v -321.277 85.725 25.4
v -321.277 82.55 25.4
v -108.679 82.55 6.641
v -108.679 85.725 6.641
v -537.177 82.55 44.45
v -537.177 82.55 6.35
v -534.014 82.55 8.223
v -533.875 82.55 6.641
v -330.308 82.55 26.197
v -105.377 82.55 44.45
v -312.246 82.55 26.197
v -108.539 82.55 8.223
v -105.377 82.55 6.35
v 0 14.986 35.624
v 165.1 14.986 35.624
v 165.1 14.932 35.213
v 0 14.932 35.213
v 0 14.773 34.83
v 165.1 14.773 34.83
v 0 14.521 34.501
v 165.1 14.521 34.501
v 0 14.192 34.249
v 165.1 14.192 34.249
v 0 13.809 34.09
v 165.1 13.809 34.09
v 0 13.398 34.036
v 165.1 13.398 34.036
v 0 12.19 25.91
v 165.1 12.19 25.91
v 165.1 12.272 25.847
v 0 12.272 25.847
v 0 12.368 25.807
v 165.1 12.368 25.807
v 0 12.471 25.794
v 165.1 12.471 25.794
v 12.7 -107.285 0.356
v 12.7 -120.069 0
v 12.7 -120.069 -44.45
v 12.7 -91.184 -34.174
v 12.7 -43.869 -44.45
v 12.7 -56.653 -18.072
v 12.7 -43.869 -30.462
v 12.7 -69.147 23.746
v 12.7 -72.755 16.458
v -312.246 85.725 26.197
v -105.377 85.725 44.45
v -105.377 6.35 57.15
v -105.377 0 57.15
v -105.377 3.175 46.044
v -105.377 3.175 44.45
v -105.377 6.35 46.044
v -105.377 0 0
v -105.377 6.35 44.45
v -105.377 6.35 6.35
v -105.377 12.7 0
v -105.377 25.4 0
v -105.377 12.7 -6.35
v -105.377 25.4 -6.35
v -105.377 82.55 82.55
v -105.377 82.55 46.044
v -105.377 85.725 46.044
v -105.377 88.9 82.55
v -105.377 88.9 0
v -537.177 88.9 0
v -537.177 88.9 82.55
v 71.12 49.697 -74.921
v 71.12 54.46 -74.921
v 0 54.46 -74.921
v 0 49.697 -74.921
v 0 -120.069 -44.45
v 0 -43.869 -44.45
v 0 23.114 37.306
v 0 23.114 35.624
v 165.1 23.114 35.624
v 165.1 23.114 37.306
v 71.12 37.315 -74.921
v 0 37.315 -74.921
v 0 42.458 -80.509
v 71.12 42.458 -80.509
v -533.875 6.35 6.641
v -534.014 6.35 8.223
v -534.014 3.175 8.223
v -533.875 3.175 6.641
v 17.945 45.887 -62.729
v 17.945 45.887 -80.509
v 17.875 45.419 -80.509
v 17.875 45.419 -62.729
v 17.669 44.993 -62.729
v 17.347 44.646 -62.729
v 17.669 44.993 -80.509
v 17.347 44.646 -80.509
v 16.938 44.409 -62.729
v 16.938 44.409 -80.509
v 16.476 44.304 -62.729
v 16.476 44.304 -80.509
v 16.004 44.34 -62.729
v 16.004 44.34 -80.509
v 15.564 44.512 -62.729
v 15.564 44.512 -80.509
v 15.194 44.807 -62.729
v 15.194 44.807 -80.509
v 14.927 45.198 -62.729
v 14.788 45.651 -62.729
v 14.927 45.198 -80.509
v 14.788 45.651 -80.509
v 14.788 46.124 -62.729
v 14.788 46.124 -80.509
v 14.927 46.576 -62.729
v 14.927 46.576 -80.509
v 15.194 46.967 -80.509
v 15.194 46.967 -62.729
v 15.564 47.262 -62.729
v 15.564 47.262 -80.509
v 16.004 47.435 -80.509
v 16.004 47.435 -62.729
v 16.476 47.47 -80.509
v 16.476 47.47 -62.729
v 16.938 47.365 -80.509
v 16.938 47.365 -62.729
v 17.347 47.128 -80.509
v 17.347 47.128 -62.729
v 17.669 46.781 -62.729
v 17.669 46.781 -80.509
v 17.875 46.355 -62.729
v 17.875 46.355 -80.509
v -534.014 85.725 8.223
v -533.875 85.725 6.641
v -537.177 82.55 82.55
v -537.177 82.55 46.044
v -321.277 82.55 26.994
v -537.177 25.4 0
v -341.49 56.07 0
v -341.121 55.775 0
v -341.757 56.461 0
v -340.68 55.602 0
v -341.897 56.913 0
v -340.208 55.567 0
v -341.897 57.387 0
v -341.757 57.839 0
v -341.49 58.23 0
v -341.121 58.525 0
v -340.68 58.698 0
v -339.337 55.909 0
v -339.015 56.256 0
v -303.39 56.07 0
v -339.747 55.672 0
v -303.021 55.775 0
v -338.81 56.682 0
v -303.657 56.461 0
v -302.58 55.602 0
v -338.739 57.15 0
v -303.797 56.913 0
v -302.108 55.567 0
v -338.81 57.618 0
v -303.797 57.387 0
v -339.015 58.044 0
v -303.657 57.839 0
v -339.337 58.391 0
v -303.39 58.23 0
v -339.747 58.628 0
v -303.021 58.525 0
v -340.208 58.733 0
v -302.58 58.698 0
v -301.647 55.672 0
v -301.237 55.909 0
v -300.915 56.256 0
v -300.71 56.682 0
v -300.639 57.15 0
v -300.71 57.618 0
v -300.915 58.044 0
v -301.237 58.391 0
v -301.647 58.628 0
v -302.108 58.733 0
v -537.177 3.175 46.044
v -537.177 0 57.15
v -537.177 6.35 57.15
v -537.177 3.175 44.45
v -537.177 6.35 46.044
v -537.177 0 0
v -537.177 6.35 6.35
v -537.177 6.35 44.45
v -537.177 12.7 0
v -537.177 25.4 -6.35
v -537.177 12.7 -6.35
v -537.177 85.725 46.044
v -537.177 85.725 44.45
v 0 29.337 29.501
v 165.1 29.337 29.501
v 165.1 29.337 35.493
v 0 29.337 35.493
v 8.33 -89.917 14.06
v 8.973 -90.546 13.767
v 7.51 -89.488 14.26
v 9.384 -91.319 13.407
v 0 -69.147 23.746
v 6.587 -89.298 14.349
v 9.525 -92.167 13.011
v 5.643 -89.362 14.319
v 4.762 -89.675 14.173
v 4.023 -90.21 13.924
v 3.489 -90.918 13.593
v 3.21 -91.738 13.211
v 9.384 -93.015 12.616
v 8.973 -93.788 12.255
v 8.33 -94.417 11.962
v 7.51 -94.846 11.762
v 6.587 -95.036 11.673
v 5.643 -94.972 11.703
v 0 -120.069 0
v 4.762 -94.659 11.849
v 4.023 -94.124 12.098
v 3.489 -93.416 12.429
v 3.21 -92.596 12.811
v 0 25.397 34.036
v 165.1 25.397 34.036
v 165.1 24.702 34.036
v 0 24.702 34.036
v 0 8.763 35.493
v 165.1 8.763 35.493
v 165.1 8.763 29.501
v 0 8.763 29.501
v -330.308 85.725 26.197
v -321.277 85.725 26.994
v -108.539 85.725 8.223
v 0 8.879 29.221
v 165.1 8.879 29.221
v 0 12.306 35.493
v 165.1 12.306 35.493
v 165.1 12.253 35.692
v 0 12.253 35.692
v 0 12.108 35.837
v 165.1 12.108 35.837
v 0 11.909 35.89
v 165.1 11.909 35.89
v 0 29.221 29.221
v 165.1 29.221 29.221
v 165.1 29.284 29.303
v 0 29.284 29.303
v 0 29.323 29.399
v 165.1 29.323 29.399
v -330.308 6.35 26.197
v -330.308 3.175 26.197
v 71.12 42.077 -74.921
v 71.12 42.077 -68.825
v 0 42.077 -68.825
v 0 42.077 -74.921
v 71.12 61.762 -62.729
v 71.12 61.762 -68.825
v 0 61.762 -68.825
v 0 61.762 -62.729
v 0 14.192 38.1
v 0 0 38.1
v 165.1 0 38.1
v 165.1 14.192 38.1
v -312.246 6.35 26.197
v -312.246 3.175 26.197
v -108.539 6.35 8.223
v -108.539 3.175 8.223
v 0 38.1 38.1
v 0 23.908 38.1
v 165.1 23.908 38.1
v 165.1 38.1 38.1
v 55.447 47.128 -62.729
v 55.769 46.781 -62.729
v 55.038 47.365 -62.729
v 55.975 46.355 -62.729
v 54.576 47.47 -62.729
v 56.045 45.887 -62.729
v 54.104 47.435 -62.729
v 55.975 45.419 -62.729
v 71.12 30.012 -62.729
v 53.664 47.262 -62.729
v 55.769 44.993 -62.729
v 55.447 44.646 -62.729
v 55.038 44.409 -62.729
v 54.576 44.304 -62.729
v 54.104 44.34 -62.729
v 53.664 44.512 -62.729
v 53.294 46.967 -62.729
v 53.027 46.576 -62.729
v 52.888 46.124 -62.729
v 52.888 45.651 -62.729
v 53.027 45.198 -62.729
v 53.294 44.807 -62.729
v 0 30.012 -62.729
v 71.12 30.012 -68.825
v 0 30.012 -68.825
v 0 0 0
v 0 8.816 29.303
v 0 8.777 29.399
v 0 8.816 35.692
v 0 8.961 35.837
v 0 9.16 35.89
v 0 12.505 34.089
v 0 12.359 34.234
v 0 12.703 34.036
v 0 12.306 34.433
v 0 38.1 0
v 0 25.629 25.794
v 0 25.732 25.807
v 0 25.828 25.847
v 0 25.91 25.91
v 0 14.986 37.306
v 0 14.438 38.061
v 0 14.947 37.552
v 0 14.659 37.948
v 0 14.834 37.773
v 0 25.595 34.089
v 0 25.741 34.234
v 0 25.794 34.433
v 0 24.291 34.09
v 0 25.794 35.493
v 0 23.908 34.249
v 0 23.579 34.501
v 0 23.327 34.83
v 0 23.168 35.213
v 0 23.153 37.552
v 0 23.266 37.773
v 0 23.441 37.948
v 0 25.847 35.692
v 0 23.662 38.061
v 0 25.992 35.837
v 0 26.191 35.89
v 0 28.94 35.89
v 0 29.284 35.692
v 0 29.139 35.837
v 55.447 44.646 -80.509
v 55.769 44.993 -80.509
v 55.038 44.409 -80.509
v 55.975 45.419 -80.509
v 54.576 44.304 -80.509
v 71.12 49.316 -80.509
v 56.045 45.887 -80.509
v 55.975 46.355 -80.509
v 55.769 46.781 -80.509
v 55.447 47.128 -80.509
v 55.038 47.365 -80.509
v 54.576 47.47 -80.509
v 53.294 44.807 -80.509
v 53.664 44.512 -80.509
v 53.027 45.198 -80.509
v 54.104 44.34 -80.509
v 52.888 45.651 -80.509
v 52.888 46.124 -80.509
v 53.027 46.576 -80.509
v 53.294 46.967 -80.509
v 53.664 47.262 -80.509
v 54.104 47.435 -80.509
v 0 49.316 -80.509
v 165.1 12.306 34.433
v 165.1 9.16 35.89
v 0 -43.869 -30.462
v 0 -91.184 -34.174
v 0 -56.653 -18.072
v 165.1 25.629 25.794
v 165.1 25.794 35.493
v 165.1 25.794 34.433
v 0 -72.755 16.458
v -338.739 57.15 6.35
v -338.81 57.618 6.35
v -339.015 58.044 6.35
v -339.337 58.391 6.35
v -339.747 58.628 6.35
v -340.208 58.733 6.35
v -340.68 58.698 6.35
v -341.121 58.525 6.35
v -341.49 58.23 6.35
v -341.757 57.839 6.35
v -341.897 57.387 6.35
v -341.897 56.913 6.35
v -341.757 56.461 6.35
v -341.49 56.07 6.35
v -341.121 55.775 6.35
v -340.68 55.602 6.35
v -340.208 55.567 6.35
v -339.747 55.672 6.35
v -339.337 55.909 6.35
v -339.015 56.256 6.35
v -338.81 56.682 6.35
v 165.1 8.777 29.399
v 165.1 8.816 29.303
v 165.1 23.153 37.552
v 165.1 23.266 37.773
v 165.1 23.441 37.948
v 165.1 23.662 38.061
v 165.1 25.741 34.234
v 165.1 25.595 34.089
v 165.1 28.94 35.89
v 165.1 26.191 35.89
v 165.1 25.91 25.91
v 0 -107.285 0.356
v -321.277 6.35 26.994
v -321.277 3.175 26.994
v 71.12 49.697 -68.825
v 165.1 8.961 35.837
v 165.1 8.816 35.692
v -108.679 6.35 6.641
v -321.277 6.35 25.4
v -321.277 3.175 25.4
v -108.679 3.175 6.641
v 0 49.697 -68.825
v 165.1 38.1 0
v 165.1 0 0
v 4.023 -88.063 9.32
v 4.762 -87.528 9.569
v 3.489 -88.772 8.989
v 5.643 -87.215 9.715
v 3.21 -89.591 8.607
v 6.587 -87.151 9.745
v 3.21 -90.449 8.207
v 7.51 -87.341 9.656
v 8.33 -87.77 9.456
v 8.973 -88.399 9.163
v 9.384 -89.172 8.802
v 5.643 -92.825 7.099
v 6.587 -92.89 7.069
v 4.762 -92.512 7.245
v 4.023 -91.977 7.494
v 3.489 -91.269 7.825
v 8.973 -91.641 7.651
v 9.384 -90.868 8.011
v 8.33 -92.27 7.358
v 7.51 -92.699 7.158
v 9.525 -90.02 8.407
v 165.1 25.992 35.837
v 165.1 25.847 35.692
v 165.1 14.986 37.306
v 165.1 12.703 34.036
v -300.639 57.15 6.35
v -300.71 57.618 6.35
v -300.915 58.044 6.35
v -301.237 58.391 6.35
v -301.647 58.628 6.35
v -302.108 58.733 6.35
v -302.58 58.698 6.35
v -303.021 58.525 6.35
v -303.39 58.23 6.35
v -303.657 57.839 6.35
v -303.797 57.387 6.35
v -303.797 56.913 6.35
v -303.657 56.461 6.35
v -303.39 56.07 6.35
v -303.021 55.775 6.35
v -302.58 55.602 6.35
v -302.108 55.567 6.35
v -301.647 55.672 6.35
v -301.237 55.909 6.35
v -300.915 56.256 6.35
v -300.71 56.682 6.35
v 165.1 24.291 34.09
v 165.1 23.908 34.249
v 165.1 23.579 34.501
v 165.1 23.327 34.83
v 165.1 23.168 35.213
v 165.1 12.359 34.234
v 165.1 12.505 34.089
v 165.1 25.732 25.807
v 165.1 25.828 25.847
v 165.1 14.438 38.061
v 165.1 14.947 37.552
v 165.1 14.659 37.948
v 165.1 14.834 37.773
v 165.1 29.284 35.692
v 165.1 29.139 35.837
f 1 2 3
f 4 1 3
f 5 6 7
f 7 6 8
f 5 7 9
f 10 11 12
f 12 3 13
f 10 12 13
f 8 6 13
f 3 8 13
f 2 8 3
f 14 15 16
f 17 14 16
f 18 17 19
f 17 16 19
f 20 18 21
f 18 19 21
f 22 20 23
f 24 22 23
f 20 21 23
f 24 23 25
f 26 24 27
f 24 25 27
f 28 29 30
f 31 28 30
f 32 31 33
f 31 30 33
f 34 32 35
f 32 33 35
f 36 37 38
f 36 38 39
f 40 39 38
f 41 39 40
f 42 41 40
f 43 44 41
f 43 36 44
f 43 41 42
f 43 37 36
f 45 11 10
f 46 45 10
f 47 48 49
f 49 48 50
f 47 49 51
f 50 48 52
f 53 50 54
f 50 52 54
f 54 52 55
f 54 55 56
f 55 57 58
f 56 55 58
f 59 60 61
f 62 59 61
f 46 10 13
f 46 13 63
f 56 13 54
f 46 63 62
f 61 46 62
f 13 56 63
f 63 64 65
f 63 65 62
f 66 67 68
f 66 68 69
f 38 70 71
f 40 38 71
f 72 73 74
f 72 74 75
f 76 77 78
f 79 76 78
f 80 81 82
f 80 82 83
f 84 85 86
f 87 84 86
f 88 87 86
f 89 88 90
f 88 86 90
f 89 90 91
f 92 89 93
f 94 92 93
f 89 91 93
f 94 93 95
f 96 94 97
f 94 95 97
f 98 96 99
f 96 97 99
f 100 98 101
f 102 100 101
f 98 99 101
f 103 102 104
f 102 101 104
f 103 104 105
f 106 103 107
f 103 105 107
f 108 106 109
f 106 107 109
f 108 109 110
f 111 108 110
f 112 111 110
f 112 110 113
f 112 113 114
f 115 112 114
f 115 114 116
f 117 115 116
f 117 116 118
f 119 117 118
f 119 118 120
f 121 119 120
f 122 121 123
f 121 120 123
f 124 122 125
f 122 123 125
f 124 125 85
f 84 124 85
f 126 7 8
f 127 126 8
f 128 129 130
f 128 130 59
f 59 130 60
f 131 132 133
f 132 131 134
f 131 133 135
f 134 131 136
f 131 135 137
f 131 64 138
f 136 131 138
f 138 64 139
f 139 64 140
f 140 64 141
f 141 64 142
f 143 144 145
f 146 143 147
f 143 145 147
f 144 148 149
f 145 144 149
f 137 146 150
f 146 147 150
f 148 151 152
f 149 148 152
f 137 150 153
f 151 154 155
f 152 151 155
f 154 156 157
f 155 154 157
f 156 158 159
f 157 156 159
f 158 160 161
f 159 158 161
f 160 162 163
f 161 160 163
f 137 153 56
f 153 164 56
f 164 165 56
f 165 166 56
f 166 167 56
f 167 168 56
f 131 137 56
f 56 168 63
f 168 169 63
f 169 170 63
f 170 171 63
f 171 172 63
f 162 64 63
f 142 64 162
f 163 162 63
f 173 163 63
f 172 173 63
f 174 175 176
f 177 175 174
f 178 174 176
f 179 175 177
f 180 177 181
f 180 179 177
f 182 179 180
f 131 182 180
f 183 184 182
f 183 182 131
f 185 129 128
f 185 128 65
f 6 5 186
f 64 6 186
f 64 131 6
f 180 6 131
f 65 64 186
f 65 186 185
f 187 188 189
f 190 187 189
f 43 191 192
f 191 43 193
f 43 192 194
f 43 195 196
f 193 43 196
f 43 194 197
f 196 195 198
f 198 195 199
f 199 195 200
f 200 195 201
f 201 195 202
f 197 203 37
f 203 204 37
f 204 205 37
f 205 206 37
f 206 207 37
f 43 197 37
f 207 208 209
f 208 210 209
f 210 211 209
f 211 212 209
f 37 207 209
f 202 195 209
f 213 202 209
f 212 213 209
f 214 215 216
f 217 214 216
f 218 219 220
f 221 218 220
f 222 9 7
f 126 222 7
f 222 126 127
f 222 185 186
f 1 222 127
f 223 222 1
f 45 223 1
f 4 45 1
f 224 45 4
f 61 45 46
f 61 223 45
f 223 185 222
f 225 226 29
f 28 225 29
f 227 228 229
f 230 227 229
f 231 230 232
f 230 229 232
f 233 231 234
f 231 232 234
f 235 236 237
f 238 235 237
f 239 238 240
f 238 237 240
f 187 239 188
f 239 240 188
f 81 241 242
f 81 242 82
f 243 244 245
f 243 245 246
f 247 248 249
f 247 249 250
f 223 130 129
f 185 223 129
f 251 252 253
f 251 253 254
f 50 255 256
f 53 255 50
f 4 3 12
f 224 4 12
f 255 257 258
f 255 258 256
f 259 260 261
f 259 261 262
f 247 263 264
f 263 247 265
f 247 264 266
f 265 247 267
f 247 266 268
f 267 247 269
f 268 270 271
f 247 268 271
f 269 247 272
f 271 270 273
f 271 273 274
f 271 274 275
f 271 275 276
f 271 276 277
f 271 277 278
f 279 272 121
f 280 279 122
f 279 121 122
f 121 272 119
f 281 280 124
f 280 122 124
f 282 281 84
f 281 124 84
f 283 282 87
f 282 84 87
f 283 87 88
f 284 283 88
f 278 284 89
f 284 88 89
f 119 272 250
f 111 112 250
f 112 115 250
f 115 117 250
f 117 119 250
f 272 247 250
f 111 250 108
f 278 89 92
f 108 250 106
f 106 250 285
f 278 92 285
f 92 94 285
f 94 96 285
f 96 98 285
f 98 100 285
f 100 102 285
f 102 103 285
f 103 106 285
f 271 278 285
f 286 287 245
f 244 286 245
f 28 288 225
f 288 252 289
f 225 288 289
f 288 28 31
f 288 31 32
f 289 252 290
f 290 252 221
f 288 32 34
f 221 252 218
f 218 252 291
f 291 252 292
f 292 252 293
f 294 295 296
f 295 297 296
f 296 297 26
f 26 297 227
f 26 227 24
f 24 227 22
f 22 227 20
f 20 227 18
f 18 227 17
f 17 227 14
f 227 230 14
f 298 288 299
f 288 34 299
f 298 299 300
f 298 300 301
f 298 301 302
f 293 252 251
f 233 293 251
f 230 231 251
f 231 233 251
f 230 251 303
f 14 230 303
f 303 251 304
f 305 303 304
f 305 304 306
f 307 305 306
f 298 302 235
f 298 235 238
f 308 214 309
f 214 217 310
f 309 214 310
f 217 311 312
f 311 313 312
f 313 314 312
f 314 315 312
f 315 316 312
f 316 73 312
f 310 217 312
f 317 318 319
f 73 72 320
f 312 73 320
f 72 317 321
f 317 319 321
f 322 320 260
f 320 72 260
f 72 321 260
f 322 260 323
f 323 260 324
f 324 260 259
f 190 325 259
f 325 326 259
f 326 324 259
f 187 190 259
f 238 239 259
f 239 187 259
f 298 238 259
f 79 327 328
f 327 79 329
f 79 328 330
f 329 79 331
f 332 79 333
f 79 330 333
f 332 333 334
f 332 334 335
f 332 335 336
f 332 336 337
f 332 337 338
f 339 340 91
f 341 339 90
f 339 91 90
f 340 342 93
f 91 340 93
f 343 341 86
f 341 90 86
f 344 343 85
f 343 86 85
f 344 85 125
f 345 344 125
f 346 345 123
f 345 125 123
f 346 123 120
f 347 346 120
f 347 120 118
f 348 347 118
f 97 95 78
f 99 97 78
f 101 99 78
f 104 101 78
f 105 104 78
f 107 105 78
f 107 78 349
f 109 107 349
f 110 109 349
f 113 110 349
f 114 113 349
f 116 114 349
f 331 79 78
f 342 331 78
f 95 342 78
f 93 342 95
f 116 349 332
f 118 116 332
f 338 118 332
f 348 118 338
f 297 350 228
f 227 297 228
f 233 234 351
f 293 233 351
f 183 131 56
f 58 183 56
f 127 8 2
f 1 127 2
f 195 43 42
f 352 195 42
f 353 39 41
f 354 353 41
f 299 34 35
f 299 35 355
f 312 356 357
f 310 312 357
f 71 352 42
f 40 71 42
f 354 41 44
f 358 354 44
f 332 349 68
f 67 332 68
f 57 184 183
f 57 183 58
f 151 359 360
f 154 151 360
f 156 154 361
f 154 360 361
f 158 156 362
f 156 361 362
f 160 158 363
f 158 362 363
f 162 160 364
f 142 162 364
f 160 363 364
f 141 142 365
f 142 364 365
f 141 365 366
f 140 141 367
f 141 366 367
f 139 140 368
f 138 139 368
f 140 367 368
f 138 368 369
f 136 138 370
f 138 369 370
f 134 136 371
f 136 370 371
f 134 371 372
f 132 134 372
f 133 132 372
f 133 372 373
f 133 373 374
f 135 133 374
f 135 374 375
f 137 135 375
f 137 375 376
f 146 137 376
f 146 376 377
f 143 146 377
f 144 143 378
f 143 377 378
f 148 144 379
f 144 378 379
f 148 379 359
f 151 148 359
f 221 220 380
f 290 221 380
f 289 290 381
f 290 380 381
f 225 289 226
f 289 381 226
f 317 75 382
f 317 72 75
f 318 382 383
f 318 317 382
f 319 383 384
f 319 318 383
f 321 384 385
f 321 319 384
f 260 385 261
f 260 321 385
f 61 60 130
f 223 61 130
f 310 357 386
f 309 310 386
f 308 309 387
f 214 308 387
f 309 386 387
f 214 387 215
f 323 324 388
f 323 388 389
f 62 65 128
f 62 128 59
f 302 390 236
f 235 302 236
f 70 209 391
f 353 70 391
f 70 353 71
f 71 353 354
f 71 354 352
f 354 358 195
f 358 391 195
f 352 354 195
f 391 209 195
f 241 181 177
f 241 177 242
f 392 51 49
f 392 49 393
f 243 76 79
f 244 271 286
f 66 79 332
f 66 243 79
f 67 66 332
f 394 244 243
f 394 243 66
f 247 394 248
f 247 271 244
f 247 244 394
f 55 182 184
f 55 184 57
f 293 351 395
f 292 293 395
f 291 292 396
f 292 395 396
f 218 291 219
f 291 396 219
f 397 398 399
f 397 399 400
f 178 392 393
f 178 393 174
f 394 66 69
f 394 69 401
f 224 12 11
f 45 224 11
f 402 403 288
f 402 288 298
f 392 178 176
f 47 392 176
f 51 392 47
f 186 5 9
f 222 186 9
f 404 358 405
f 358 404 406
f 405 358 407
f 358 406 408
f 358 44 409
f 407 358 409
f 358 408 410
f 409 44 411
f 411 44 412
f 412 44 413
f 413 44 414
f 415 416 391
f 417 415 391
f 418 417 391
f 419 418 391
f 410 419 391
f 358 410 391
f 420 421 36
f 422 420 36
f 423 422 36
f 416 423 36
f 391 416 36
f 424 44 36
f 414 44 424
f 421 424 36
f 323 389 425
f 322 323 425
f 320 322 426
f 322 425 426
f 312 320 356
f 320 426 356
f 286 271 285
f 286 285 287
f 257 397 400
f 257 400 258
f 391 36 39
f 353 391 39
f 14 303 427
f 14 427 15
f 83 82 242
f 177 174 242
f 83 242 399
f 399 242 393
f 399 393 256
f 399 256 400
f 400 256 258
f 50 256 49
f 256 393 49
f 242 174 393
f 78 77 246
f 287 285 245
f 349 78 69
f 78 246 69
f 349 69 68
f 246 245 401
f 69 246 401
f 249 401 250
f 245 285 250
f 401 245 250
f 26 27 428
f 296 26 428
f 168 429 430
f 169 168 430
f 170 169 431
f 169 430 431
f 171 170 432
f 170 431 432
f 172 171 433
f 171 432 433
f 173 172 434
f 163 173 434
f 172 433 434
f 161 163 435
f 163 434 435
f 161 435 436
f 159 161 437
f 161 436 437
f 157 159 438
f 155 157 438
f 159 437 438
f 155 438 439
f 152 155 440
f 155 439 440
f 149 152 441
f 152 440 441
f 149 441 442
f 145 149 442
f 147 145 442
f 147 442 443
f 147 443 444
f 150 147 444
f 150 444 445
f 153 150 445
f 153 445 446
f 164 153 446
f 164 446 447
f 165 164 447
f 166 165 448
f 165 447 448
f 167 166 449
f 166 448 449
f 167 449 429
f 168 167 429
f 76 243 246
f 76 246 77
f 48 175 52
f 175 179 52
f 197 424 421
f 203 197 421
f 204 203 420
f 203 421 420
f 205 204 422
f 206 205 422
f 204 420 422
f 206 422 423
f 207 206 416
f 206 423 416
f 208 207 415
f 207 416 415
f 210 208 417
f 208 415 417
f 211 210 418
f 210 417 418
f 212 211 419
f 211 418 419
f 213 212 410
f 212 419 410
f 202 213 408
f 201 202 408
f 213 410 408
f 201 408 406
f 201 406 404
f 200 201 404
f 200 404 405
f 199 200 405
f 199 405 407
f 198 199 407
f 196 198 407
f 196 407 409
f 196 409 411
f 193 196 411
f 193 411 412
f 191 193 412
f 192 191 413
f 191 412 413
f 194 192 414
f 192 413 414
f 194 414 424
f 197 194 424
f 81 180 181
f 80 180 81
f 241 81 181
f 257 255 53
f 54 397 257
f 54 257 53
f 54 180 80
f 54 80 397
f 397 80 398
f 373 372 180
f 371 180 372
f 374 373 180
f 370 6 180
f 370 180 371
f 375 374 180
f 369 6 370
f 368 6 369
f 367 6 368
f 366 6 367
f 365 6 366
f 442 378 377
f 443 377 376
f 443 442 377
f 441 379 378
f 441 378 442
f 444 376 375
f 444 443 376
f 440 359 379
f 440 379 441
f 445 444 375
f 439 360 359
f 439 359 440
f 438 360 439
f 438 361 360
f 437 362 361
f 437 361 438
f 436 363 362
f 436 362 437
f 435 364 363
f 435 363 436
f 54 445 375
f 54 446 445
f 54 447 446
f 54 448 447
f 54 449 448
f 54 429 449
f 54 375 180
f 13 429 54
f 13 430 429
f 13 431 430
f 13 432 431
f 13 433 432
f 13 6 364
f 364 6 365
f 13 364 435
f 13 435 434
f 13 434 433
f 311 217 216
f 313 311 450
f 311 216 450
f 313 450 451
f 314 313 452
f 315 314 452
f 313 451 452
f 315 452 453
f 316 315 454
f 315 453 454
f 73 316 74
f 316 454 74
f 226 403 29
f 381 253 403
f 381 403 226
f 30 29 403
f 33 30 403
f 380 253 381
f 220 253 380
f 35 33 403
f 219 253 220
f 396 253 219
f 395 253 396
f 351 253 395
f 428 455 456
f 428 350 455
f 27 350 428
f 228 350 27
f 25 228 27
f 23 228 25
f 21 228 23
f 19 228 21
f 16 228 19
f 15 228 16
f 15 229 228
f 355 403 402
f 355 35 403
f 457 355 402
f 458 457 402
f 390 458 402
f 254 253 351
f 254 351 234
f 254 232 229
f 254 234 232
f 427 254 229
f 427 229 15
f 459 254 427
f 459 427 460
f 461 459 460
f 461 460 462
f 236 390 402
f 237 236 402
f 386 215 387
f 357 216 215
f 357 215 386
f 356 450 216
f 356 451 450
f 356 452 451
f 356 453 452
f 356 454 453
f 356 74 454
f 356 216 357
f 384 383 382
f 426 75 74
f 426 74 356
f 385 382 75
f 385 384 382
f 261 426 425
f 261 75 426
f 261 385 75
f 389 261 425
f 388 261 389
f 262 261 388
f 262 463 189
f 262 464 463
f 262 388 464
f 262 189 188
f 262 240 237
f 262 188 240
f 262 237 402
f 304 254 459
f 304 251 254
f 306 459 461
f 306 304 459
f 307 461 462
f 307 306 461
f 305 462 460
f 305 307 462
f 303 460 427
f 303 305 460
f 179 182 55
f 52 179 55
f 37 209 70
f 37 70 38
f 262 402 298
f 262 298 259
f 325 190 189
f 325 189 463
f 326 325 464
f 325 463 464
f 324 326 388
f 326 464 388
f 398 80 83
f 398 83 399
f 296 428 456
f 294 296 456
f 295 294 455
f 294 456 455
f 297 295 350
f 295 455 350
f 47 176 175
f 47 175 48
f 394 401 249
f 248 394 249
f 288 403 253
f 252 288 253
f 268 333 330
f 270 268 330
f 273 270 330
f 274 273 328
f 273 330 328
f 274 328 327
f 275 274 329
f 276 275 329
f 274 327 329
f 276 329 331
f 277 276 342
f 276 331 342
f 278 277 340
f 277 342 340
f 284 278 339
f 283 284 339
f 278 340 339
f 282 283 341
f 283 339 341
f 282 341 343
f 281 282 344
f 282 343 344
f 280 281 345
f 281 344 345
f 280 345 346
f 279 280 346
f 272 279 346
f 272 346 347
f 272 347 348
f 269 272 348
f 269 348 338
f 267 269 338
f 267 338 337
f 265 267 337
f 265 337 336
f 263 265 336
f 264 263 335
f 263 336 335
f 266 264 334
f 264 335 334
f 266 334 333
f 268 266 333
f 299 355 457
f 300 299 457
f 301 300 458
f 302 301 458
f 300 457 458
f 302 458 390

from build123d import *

# Parameters (mm, degrees)
F0_W          = 38.1
F0_H          = 38.1
F1_DEPTH      = 165.1
F2_W          = 431.8
F2_H          = 6.35
F2_H_2        = 76.2
F3_DEPTH      = 6.35
F4_W          = 431.8
F4_H          = 6.35
F5_DEPTH      = 76.2
F6_W          = 431.8
F6_H          = 6.35
F7_DEPTH      = 50.8
F9_DEPTH      = 3.175
F9_DEPTH_BACK = 79.375
F10_W         = 431.8
F10_H         = 12.7
F11_DEPTH     = 6.35
F13_DEPTH     = 12.7
F14_DEPTH     = 44.45
F16_DEPTH     = 12.7
F17_R         = 3.175
F18_DEPTH     = 5.08
F20_DEPTH     = 165.1
F21_R         = 0.79375
F23_DEPTH     = 71.12
F24_R         = 1.5875
F25_DEPTH     = 17.78
F26_R         = 1.5875
F27_DEPTH     = 6.35
F29_DEPTH     = 12.7


# Not quite as in the source:
# - a feature names something its author has since deleted; it is built from what else it names


with BuildPart() as f1:
    # F0 (on Right) → F1 (new body)
    with BuildSketch(Plane.YZ):
        with Locations((19.05, 19.05)):
            Rectangle(F0_W, F0_H)
    extrude(amount=F1_DEPTH)

    # F19 (on face) → F20 (cut, through all)
    with BuildSketch(Plane.YZ.offset(165.1)):
        with BuildLine():
            Line((12.4706910076, 25.7937), (19.05, 25.7937))
            Line((19.05, 25.7937), (25.6293089924, 25.7937))
            ThreePointArc((25.6293089924, 25.7937), (25.7811864797, 25.8239103105), (25.9099419962, 25.9099419962))
            Line((25.9099419962, 25.9099419962), (29.2207580038, 29.2207580038))
            ThreePointArc((29.2207580038, 29.2207580038), (29.3067896895, 29.3495135203), (29.337, 29.5013910076))
            Line((29.337, 29.5013910076), (29.337, 35.493325))
            ThreePointArc((29.337, 35.493325), (29.2207580038, 35.7739580038), (28.940125, 35.8902))
            Line((28.940125, 35.8902), (26.190575, 35.8902))
            ThreePointArc((26.190575, 35.8902), (25.9099419962, 35.7739580038), (25.7937, 35.493325))
            Line((25.7937, 35.493325), (25.7937, 34.432875))
            ThreePointArc((25.7937, 34.432875), (25.6774580038, 34.1522419962), (25.396825, 34.036))
            Line((25.396825, 34.036), (24.7015, 34.036))
            ThreePointArc((24.7015, 34.036), (23.5789679849, 34.5009679849), (23.114, 35.6235))
            Line((23.114, 35.6235), (23.114, 38.1))
            Line((23.114, 38.1), (19.05, 38.1))
            Line((19.05, 38.1), (14.986, 38.1))
            Line((14.986, 38.1), (14.986, 35.6235))
            ThreePointArc((14.986, 35.6235), (14.5210320151, 34.5009679849), (13.3985, 34.036))
            Line((13.3985, 34.036), (12.703175, 34.036))
            ThreePointArc((12.703175, 34.036), (12.4225419962, 34.1522419962), (12.3063, 34.432875))
            Line((12.3063, 34.432875), (12.3063, 35.493325))
            ThreePointArc((12.3063, 35.493325), (12.1900580038, 35.7739580038), (11.909425, 35.8902))
            Line((11.909425, 35.8902), (9.159875, 35.8902))
            ThreePointArc((9.159875, 35.8902), (8.8792419962, 35.7739580038), (8.763, 35.493325))
            Line((8.763, 35.493325), (8.763, 29.5013910076))
            ThreePointArc((8.763, 29.5013910076), (8.7932103105, 29.3495135203), (8.8792419962, 29.2207580038))
            Line((8.8792419962, 29.2207580038), (12.1900580038, 25.9099419962))
            ThreePointArc((12.1900580038, 25.9099419962), (12.3188135203, 25.8239103105), (12.4706910076, 25.7937))
        make_face()
    extrude(amount=-F20_DEPTH, mode=Mode.SUBTRACT)

    # F21
    f21_edges = [f1.edges().sort_by_distance(p)[0] for p in [
        (82.55, 14.986, 38.1),
        (82.55, 23.114, 38.1),
    ]]
    fillet(f21_edges, radius=F21_R)


with BuildPart() as f3:
    # F2 (on Top) → F3 (new body)
    with BuildSketch(Plane.XY):
        with Locations((-321.2767546883, 3.175)):
            Rectangle(F2_W, F2_H)
        with Locations((-321.2767546883, 44.45)):
            Rectangle(F2_W, F2_H_2)
        with Locations((-321.2767546883, 85.725)):
            Rectangle(F2_W, F2_H)
    extrude(amount=F3_DEPTH)

    # F4 (on face) → F5 (join)
    with BuildSketch(Plane.XY.offset(6.35)):
        with Locations((-321.2767546883, 85.725)):
            Rectangle(F4_W, F4_H)
    extrude(amount=F5_DEPTH)

    # F6 (on face) → F7 (join)
    with BuildSketch(Plane.XY.offset(6.35)):
        with Locations((-321.2767546883, 3.175)):
            Rectangle(F6_W, F6_H)
    extrude(amount=F7_DEPTH)

    # F8 (on face) → F9 (cut, two sides)
    with BuildSketch(Plane.XZ.offset(-82.55)) as f9_sk:
        Polygon((-537.1767546883, 44.45), (-330.3075385094, 26.1968338666), (-321.2767546883, 26.9936677331), (-537.1767546883, 46.0436677331), align=None)
        Polygon((-321.2767546883, 26.9936677331), (-312.2459708672, 26.1968338666), (-105.3767546883, 44.45), (-105.3767546883, 46.0436677331), align=None)
        Polygon((-321.2767546883, 25.4), (-108.678998386, 6.6413744439), (-108.5394669621, 8.2227305808), (-312.2459708672, 26.1968338666), align=None)
        Polygon((-330.3075385094, 26.1968338666), (-321.2767546883, 25.4), (-312.2459708672, 26.1968338666), (-321.2767546883, 26.9936677331), align=None)
        Polygon((-533.8745109906, 6.6413744439), (-321.2767546883, 25.4), (-330.3075385094, 26.1968338666), (-534.0140424144, 8.2227305808), align=None)
    extrude(amount=-F9_DEPTH, mode=Mode.SUBTRACT)
    extrude(f9_sk.sketch, amount=F9_DEPTH_BACK, mode=Mode.SUBTRACT)

    # F10 (on face) → F11 (join)
    with BuildSketch(Plane(origin=(0, 0, 0), x_dir=(1, 0, 0), z_dir=(0, 0, -1))):
        with Locations((-321.2767546883, -19.05)):
            Rectangle(F10_W, F10_H)
    extrude(amount=F11_DEPTH)

    # F26 (on face) → F27 (cut, through all)
    with BuildSketch(Plane.XY.offset(6.35)):
        with Locations((-302.2267546883, 57.15)):
            Circle(F26_R)
        with Locations((-340.3267546883, 57.15)):
            Circle(F26_R)
    extrude(amount=-F27_DEPTH, mode=Mode.SUBTRACT)


with BuildPart() as f13:
    # F12 (on Right) → F13 (new body)
    with BuildSketch(Plane.YZ):
        Polygon((-120.0692180491, 0), (-43.8692180491, 0), (-43.8692180491, 35.5326435514), align=None)
    extrude(amount=F13_DEPTH)

    # F14 (add): a face of the model
    f14_faces = [f13.faces().sort_by_distance(p)[0] for p in [
        (6.35, -81.9692180491, 0),
    ]]
    extrude(f14_faces, amount=F14_DEPTH)

    # F15 (on face) → F16 (cut, through all)
    with BuildSketch(Plane.YZ.offset(12.7)):
        Polygon((-56.6531768199, -18.0724728657), (-72.7549325922, 16.4578538203), (-107.2852592783, 0.356098048), (-91.1835035059, -34.1742286381), align=None)
    extrude(amount=-F16_DEPTH, mode=Mode.SUBTRACT)

    # F17 (on face) → F18 (cut, through all)
    with BuildSketch(Plane(origin=(0, -19.2982054215, 41.3851350799), x_dir=(1, 0, 0), z_dir=(0, 0.4226182617, -0.906307787))):
        with Locations((6.35, 78.0329723801)):
            Circle(F17_R)
    extrude(amount=-F18_DEPTH, mode=Mode.SUBTRACT)

    # F28 (on face) → F29 (cut, through all)
    with BuildSketch(Plane.YZ.offset(12.7)):
        Polygon((-43.8692180491, 35.5326435514), (-69.1467789141, 23.7455233405), (-43.8692180491, -30.4623808682), align=None)
    extrude(amount=-F29_DEPTH, mode=Mode.SUBTRACT)


with BuildPart() as f23:
    # F22 (on Right) → F23 (new body)
    with BuildSketch(Plane.YZ):
        Polygon((61.7622073192, -62.7286910119), (30.0122073192, -62.7286910119), (30.0122073192, -68.8246910119), (42.0772073192, -68.8246910119), (42.0772073192, -74.9206910119), (37.3147073192, -74.9206910119), (42.4582073192, -80.5086910119), (49.3162073192, -80.5086910119), (54.4597073192, -74.9206910119), (49.6972073192, -74.9206910119), (49.6972073192, -68.8246910119), (61.7622073192, -68.8246910119), align=None)
    extrude(amount=F23_DEPTH)

    # F24 (on face) → F25 (cut, through all)
    with BuildSketch(Plane(origin=(0, 0, -80.5086910119), x_dir=(1, 0, 0), z_dir=(0, 0, -1))):
        with Locations((54.4576, -45.8872073192)):
            Circle(F24_R)
        with Locations((16.3576, -45.8872073192)):
            Circle(F24_R)
    extrude(amount=-F25_DEPTH, mode=Mode.SUBTRACT)


solid = Compound([f1.part, f3.part, f13.part, f23.part])
